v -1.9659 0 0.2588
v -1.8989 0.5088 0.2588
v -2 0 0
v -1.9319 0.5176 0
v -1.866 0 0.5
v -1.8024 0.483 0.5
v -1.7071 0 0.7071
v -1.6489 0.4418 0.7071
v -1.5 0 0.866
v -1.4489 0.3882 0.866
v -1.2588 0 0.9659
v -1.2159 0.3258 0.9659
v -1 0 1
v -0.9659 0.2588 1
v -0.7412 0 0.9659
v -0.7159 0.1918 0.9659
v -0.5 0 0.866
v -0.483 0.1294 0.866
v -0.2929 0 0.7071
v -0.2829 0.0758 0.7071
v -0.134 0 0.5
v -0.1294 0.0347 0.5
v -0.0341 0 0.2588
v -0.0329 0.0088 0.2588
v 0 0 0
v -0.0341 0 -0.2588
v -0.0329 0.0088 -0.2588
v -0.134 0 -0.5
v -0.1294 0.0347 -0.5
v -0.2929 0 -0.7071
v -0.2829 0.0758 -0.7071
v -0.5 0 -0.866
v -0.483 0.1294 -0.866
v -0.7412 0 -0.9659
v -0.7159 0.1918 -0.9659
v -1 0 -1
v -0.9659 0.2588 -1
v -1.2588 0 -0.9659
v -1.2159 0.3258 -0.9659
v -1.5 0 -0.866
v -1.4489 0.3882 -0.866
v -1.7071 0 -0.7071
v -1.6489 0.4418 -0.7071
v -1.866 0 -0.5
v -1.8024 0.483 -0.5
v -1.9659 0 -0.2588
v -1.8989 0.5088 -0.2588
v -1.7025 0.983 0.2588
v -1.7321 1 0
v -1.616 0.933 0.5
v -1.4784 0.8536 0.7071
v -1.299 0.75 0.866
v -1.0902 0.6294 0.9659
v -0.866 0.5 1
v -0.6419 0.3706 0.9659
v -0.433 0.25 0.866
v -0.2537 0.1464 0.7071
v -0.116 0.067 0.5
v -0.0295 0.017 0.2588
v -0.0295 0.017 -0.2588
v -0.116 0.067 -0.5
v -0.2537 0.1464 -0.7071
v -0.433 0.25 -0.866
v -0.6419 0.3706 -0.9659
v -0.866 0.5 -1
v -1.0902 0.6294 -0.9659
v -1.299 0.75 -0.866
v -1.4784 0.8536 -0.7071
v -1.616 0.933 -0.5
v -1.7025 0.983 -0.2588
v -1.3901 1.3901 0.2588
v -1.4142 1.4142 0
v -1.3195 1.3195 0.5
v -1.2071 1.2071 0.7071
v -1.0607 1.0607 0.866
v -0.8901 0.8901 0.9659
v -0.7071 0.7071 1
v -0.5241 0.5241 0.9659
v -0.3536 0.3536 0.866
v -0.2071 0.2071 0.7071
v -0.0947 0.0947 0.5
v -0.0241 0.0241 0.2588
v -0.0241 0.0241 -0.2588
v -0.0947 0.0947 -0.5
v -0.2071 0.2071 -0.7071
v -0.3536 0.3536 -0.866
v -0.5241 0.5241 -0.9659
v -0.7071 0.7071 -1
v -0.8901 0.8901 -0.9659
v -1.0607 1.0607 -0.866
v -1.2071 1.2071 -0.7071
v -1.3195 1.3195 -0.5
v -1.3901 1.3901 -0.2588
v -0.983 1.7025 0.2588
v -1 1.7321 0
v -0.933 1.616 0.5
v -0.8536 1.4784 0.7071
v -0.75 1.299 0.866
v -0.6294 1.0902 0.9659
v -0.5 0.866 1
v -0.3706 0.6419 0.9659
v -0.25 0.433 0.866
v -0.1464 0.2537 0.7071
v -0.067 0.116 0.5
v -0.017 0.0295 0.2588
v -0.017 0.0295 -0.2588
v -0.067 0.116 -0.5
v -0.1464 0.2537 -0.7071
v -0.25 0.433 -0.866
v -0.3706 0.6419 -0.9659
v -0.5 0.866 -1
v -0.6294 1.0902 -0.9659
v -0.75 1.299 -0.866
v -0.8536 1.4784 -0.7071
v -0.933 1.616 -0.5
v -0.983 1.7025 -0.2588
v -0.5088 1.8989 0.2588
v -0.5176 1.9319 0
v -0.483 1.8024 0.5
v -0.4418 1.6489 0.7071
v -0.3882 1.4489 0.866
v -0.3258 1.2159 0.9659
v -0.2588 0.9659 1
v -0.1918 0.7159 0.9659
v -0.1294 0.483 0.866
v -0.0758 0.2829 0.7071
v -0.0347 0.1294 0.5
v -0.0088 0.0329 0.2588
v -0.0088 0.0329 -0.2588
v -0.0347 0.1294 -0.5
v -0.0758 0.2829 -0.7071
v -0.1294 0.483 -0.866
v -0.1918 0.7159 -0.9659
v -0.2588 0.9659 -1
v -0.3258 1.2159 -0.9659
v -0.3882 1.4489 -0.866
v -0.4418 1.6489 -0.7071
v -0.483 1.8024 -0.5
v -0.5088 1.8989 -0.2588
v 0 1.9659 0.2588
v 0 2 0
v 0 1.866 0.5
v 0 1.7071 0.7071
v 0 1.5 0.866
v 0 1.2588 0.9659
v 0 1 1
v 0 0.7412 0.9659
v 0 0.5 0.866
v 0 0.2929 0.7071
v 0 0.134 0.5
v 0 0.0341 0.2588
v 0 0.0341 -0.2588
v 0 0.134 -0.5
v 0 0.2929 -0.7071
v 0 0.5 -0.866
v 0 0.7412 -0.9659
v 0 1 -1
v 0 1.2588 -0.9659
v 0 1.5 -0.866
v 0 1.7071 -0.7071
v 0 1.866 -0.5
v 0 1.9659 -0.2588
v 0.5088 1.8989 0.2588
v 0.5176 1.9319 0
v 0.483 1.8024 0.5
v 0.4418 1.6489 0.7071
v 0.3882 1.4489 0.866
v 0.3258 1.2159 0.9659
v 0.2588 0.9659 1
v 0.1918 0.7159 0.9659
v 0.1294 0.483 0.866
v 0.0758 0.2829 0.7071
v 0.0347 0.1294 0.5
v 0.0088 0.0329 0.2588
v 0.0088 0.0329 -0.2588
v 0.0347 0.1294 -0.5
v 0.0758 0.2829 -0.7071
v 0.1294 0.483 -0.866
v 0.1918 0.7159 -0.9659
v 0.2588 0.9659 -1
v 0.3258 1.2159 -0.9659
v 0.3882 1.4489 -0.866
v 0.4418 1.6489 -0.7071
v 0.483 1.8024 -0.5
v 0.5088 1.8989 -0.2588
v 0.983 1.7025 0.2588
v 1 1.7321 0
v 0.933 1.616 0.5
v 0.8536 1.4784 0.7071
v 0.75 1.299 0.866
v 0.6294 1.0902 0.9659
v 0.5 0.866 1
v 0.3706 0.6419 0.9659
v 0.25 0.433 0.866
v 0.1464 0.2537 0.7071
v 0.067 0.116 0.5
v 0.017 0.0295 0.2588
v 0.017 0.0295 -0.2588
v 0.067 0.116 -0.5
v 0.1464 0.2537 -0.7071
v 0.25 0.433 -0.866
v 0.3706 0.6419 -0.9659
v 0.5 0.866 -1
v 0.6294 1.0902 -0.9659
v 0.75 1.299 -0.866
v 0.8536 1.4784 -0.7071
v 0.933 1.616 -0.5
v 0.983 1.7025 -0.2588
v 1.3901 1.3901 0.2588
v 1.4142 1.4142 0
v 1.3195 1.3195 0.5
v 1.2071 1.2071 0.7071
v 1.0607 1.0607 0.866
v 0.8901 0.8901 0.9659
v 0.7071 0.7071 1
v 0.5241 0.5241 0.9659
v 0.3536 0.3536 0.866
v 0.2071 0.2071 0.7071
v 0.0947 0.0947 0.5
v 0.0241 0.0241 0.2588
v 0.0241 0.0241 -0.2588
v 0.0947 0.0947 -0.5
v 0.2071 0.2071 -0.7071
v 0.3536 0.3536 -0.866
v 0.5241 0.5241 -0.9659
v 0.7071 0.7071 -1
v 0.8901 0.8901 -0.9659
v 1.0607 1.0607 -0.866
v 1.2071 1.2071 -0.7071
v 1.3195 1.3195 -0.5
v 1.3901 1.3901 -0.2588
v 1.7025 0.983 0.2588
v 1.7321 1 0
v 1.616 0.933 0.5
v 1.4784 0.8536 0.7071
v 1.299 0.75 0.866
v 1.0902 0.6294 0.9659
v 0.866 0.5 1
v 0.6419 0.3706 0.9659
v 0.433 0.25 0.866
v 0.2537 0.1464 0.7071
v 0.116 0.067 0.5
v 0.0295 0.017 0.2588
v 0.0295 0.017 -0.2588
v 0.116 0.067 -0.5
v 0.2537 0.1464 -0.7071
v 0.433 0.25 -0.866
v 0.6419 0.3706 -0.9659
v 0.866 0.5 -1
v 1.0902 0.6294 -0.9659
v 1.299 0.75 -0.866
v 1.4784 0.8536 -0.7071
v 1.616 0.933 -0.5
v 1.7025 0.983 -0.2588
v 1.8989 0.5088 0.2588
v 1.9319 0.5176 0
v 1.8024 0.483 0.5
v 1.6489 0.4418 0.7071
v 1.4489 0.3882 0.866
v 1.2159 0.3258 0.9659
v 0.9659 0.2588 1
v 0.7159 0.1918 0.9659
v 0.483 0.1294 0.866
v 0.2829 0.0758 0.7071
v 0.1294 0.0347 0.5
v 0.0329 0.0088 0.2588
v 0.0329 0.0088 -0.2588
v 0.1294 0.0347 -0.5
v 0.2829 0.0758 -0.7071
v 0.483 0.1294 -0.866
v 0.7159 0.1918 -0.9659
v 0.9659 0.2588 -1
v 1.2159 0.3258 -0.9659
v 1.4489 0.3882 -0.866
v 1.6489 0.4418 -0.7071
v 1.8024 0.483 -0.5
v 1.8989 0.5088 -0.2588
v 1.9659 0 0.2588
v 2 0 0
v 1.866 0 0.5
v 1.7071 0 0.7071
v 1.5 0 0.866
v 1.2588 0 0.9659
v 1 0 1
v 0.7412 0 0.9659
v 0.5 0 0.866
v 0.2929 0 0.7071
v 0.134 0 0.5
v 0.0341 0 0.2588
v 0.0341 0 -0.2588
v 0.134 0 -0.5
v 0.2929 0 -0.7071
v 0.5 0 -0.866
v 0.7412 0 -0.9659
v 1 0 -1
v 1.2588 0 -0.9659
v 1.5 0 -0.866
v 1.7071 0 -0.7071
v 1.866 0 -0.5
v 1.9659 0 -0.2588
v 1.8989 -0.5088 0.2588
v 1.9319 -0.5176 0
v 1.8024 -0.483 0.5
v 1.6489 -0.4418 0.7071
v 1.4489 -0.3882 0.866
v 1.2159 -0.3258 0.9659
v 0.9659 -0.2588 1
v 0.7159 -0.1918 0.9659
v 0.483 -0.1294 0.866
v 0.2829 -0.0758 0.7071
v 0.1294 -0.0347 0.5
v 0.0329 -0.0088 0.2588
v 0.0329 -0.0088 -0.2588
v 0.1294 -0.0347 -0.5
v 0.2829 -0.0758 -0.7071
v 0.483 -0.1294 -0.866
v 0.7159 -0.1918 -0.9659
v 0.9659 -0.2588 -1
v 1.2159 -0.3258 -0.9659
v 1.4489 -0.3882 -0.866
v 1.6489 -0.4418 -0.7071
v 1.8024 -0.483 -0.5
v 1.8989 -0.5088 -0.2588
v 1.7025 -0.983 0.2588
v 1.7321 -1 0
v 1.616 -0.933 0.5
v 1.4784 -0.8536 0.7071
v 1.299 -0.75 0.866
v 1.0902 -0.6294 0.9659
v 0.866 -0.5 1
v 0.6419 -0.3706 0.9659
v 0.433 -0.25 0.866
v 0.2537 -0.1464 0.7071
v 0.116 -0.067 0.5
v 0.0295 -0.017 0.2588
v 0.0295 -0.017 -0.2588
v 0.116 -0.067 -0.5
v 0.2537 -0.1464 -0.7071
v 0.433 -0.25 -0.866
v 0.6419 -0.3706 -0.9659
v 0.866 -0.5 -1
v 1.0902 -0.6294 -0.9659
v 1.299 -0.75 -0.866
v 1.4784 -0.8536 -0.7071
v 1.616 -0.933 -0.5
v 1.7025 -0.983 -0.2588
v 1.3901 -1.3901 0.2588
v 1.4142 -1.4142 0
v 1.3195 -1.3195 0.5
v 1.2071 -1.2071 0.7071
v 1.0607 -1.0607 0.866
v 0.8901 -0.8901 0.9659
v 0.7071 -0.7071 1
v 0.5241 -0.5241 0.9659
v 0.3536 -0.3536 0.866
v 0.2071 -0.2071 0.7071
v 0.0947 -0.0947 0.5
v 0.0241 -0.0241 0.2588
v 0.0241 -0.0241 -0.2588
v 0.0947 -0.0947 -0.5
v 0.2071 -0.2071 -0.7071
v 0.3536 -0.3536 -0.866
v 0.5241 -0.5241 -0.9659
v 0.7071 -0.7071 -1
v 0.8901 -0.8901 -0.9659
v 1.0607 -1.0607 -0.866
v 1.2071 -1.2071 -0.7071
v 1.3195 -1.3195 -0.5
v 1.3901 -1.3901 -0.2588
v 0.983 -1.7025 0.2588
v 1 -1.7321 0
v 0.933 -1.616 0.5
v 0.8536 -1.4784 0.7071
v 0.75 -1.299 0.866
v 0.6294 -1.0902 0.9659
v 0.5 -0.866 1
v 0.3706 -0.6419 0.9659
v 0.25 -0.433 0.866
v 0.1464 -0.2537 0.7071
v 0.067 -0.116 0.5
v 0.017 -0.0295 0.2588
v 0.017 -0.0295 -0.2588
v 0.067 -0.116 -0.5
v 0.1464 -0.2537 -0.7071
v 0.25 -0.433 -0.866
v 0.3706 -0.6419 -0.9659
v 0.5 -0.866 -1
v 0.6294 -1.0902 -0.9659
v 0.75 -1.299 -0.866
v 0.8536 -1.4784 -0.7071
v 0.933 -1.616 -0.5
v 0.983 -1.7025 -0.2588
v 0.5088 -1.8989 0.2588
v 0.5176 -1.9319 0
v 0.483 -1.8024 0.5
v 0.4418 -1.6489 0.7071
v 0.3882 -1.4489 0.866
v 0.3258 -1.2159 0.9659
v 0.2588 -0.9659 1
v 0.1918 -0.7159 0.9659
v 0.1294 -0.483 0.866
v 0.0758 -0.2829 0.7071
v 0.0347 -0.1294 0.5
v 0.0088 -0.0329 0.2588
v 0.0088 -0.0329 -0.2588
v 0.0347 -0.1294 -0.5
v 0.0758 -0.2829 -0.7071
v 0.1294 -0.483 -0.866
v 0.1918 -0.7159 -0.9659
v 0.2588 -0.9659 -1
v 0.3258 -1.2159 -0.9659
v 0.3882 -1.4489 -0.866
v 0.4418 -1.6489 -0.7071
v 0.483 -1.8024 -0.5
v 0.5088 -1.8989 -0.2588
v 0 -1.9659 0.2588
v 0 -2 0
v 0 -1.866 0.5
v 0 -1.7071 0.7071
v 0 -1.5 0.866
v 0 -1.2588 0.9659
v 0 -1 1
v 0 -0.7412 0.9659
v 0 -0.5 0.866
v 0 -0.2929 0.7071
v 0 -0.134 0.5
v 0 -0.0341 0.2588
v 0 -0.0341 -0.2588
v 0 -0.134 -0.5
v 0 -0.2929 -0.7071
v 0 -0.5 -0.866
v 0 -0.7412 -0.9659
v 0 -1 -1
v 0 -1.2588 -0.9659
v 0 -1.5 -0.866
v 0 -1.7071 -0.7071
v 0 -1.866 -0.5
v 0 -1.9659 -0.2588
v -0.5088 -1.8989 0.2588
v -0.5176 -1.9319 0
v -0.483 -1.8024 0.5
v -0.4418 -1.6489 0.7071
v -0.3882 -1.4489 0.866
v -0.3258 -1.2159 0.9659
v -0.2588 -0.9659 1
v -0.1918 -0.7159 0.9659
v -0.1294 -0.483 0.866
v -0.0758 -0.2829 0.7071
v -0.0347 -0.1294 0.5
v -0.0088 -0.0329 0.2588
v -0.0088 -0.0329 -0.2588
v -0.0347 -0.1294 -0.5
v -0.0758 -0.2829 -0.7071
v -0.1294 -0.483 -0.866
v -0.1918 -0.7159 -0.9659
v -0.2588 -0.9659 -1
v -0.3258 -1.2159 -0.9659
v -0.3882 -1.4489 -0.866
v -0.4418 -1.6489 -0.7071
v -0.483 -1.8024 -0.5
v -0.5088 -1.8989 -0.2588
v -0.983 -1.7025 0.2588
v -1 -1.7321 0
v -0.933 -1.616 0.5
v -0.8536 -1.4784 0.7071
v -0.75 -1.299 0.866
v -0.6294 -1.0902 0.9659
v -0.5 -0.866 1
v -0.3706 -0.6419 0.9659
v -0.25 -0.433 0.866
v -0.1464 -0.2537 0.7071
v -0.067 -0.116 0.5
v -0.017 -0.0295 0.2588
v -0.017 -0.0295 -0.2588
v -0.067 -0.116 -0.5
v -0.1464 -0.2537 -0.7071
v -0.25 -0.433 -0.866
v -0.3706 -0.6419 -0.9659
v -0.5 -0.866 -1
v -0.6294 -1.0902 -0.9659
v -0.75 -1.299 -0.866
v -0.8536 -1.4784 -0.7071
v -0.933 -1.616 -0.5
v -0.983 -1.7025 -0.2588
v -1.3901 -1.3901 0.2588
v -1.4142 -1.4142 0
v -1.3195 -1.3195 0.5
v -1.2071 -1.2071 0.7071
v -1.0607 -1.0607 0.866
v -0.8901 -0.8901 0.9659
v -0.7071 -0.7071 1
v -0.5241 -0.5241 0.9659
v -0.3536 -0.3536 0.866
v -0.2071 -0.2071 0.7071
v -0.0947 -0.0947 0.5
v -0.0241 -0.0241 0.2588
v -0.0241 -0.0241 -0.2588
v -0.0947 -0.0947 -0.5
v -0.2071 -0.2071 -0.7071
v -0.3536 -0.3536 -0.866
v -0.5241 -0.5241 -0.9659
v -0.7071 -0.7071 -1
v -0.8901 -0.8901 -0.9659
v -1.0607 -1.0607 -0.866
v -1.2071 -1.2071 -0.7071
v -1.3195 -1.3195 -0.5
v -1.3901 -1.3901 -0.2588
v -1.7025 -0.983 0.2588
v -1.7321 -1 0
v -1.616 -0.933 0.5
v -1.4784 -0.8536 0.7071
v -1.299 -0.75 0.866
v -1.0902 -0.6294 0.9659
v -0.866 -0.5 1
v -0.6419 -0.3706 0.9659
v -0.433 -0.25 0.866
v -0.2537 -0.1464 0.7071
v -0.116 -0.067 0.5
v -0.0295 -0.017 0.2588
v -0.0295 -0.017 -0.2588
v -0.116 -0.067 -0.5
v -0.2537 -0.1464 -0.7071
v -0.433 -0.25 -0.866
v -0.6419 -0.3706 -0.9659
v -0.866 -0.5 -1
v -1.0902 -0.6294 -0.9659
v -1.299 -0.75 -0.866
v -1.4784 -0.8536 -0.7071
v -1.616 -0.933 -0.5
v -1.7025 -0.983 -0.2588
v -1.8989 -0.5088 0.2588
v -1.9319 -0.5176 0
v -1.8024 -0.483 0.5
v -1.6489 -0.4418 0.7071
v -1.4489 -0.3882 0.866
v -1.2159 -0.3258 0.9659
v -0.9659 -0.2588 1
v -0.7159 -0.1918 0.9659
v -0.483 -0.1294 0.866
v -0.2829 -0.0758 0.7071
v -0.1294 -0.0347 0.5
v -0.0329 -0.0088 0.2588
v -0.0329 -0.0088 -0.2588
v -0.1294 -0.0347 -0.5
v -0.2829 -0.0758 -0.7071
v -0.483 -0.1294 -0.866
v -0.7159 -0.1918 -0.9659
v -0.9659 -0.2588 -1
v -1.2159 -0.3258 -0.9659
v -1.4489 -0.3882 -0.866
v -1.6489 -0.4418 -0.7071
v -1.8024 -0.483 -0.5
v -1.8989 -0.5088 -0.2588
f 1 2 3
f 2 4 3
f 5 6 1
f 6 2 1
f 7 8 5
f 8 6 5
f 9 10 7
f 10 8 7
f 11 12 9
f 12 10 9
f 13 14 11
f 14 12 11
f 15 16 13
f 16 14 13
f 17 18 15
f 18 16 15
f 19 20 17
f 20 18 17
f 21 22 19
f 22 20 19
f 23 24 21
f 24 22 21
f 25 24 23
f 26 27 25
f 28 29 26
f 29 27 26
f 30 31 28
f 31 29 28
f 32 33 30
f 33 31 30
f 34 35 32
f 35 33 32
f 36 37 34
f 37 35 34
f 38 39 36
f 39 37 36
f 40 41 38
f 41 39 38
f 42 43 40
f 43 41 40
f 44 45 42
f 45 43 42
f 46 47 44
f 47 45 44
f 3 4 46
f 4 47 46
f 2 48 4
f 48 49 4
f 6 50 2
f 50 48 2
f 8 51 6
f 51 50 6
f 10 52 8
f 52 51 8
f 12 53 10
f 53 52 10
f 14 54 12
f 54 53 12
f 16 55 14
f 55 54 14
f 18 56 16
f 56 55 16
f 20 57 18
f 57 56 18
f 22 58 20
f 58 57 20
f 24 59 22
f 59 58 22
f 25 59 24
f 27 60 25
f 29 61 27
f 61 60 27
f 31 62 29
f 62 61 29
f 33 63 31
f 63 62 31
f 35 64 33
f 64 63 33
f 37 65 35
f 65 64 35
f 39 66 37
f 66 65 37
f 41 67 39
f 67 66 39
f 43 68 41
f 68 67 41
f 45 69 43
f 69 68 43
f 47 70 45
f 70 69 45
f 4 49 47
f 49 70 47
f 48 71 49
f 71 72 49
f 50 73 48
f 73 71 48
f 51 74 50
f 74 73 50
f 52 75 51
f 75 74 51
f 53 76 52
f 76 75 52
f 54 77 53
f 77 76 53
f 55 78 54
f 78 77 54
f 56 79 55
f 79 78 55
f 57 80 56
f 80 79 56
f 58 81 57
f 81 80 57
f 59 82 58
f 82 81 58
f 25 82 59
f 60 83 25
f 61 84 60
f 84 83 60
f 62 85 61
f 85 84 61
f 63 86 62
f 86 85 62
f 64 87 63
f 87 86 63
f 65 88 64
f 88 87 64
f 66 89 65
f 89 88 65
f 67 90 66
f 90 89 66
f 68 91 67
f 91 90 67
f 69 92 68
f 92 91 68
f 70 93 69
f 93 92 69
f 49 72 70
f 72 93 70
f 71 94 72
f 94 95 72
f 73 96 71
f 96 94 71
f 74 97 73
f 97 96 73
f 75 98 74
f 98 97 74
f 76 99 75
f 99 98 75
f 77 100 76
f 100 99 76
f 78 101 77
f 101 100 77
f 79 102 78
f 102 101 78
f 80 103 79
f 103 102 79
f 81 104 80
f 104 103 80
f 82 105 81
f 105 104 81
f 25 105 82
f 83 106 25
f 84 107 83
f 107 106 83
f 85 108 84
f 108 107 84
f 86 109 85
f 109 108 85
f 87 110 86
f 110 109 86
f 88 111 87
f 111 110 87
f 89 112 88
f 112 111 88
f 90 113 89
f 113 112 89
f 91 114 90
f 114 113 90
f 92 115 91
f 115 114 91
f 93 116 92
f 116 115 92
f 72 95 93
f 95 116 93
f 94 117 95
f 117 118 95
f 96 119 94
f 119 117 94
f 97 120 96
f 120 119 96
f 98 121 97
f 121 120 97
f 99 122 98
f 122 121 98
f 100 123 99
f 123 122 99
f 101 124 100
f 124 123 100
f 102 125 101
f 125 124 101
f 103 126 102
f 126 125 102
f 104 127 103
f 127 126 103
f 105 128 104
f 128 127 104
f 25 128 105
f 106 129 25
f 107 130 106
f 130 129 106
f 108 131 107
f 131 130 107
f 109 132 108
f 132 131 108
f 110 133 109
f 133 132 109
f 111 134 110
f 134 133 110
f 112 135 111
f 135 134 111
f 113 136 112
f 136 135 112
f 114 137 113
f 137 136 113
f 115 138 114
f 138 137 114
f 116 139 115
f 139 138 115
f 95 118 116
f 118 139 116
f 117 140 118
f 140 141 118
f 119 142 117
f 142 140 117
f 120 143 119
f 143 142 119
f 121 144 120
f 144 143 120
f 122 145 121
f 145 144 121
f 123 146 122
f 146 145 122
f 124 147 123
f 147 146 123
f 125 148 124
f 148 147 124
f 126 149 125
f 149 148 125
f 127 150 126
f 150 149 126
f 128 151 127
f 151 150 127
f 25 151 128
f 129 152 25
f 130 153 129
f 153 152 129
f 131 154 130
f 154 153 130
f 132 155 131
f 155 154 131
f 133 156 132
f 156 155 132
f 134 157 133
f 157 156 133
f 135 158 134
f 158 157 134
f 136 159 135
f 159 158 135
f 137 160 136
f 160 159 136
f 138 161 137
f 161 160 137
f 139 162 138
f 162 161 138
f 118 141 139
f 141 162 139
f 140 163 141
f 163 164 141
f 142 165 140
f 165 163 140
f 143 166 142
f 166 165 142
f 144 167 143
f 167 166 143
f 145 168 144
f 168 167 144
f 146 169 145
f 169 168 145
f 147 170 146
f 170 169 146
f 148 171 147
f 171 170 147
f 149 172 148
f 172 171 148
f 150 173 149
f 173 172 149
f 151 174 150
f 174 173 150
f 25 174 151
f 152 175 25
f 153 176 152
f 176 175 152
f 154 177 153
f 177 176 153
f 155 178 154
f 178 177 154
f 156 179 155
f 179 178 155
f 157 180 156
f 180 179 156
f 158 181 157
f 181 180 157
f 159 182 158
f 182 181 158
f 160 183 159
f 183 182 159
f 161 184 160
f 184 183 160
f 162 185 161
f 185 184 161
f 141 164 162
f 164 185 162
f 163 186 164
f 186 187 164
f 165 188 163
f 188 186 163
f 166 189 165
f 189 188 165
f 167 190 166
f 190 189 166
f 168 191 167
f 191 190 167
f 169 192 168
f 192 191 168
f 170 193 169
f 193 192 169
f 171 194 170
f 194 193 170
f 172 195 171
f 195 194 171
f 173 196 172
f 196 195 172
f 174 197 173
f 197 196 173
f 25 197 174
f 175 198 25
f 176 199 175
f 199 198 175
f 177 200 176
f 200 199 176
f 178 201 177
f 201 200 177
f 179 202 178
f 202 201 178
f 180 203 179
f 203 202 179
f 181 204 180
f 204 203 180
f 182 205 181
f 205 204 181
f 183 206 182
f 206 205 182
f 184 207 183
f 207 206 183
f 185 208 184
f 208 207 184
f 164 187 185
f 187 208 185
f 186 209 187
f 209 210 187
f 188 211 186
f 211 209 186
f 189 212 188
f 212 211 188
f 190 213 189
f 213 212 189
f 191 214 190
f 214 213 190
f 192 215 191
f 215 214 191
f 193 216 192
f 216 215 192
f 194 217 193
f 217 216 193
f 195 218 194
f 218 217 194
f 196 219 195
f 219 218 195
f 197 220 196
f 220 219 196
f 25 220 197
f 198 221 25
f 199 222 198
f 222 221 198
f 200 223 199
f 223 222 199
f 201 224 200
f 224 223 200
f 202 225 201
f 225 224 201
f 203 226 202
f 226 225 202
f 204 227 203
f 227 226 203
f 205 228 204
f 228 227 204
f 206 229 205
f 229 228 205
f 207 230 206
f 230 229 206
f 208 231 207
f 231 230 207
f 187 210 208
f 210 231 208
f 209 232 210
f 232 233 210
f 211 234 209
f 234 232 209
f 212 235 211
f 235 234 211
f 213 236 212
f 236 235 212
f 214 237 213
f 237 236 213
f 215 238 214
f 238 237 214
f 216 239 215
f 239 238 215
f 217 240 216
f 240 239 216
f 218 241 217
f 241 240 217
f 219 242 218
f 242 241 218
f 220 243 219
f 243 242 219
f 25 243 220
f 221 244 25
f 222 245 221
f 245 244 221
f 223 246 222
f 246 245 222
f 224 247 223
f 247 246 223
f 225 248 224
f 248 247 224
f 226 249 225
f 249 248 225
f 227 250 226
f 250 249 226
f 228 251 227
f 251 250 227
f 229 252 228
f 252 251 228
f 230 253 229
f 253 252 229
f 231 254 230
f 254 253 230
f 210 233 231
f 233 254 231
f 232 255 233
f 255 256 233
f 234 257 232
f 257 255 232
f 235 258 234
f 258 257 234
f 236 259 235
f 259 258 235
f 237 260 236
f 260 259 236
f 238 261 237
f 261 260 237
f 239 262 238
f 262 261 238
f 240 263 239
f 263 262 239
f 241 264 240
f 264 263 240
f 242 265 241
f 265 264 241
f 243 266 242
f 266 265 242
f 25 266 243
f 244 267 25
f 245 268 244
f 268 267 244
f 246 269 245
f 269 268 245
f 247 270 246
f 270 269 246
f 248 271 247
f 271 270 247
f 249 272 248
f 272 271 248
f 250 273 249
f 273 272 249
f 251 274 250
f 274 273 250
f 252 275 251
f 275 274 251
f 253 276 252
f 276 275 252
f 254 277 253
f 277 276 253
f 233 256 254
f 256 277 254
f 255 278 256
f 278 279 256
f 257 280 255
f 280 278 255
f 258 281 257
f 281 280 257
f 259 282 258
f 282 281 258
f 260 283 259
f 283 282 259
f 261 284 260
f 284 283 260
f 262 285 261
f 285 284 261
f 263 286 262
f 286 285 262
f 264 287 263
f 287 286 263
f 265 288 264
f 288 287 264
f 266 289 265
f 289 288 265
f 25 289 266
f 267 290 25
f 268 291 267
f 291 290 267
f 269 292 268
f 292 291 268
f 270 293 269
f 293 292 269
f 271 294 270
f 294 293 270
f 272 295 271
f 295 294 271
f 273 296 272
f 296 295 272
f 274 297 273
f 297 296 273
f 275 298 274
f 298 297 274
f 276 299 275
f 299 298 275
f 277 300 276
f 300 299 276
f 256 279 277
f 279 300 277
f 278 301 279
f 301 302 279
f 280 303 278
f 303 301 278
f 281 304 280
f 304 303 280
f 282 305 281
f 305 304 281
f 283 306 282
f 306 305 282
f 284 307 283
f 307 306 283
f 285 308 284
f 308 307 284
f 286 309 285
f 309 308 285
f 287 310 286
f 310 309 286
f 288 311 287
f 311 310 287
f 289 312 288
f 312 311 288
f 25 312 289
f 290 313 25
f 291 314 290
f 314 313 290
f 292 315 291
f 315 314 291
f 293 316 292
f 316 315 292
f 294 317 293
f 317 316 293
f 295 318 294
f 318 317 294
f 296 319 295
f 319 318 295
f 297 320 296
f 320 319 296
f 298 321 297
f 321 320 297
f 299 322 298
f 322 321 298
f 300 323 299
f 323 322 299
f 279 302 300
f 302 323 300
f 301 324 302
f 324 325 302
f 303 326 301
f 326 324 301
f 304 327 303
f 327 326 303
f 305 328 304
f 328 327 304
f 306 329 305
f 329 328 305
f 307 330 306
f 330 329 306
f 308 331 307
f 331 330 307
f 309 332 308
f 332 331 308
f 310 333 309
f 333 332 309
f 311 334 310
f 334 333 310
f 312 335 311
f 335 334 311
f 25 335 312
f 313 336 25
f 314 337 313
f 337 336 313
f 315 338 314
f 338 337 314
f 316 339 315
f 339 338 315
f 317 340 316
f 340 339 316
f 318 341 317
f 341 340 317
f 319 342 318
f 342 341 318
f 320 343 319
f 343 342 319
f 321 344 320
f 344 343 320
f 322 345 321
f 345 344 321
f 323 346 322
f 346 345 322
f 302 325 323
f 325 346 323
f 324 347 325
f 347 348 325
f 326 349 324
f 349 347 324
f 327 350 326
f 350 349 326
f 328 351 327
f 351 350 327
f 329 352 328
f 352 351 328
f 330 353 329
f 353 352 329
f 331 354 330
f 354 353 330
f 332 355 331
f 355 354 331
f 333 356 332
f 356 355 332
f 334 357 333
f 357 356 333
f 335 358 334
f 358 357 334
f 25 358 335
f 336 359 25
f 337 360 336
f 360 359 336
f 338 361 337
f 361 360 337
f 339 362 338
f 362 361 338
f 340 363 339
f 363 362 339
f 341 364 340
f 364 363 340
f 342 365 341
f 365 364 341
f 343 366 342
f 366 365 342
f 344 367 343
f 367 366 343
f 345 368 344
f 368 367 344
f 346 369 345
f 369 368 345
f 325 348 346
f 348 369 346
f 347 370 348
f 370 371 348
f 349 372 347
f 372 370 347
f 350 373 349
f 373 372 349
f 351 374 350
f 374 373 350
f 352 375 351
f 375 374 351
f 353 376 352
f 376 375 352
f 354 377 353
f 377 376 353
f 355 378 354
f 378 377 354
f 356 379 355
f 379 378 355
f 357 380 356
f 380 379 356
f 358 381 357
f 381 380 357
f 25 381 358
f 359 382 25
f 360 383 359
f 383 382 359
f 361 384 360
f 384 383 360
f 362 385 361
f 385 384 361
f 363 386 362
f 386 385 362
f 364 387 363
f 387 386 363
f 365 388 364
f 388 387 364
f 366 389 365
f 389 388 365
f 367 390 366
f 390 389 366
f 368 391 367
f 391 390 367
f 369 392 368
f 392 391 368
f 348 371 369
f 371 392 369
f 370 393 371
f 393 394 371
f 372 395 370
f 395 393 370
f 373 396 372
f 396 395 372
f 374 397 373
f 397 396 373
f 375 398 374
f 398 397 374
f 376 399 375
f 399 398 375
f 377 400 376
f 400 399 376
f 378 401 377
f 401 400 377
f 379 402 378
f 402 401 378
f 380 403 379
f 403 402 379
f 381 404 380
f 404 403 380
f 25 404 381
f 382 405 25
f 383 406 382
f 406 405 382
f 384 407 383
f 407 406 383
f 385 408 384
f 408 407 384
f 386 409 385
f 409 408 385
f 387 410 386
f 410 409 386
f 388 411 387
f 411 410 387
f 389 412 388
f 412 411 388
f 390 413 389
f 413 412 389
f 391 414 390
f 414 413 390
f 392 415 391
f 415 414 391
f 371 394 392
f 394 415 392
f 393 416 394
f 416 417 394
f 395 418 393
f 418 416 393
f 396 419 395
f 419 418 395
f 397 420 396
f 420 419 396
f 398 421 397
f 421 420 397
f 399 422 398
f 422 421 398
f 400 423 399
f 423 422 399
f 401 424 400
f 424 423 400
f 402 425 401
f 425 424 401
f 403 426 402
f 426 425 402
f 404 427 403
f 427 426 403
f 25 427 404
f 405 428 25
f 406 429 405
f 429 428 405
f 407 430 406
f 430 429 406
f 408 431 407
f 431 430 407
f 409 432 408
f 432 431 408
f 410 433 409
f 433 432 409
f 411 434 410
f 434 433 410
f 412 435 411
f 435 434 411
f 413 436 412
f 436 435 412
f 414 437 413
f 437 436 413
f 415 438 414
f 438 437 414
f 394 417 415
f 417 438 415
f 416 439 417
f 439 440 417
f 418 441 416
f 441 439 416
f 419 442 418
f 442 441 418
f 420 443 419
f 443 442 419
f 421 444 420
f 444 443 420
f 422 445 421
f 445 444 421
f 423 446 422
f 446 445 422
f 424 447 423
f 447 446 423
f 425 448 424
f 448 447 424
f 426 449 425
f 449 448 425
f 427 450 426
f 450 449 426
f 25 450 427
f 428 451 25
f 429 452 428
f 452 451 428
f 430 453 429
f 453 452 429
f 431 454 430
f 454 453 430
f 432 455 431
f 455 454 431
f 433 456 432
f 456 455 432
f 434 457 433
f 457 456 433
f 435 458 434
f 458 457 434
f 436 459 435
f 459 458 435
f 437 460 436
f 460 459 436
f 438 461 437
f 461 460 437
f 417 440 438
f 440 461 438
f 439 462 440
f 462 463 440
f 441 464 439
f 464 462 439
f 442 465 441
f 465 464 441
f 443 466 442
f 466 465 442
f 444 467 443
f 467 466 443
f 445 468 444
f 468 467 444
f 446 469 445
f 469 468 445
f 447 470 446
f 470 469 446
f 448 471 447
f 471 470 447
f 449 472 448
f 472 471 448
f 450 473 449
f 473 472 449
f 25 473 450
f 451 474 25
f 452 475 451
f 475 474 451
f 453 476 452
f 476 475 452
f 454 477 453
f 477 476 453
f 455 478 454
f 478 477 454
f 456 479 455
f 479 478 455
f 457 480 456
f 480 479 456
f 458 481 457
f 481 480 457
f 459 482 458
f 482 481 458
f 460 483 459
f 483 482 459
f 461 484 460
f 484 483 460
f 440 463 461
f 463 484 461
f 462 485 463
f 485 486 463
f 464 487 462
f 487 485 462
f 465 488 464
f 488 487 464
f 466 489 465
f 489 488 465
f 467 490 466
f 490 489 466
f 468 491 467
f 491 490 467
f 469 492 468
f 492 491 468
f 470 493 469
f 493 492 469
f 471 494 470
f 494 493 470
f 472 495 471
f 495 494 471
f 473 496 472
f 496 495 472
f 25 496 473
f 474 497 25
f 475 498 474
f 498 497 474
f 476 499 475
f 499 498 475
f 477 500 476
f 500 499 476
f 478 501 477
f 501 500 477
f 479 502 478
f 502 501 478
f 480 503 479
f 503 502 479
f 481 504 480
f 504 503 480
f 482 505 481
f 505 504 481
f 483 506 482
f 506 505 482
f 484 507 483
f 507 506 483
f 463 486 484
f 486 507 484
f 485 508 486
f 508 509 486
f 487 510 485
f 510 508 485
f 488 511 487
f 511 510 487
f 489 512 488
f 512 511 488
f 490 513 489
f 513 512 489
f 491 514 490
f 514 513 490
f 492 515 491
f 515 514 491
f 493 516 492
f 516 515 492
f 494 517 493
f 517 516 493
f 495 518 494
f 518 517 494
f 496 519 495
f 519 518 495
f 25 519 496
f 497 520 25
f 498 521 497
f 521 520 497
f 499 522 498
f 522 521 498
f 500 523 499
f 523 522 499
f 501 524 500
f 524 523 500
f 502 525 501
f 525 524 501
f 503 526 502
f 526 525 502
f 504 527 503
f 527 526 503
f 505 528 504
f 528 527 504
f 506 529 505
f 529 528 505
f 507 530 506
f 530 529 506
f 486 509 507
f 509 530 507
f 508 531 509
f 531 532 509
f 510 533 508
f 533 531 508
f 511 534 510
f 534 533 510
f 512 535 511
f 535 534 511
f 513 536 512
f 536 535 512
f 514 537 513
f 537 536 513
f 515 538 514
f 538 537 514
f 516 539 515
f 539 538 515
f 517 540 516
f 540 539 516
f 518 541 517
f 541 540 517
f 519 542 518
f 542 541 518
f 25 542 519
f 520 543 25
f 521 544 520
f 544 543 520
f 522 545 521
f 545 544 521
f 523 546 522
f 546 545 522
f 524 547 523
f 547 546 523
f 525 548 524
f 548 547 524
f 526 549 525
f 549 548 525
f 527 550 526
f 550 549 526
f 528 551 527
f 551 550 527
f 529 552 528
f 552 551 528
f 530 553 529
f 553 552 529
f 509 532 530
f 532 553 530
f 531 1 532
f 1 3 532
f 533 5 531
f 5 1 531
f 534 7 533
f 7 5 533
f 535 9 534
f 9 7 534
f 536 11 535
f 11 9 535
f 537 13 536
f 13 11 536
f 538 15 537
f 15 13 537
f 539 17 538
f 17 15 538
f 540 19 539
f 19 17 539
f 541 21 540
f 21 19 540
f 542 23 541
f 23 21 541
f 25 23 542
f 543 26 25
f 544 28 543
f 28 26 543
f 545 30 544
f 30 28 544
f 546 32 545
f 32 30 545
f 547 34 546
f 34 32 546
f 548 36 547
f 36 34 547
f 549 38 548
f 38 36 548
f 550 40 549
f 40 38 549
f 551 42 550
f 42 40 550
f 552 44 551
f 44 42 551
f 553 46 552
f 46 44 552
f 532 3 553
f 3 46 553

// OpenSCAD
// This model causes a CGAL assertion in CGAL_Nef_polyhedron3(CGAL_Polyhedron) constructor.
// One cause of this error could be that the grid handling in PolySet degenerated the original
// mesh into a non-manifold one.

rotate_extrude($fn = 24) translate ([ 1, 0, 0 ]) circle (r = 1);
